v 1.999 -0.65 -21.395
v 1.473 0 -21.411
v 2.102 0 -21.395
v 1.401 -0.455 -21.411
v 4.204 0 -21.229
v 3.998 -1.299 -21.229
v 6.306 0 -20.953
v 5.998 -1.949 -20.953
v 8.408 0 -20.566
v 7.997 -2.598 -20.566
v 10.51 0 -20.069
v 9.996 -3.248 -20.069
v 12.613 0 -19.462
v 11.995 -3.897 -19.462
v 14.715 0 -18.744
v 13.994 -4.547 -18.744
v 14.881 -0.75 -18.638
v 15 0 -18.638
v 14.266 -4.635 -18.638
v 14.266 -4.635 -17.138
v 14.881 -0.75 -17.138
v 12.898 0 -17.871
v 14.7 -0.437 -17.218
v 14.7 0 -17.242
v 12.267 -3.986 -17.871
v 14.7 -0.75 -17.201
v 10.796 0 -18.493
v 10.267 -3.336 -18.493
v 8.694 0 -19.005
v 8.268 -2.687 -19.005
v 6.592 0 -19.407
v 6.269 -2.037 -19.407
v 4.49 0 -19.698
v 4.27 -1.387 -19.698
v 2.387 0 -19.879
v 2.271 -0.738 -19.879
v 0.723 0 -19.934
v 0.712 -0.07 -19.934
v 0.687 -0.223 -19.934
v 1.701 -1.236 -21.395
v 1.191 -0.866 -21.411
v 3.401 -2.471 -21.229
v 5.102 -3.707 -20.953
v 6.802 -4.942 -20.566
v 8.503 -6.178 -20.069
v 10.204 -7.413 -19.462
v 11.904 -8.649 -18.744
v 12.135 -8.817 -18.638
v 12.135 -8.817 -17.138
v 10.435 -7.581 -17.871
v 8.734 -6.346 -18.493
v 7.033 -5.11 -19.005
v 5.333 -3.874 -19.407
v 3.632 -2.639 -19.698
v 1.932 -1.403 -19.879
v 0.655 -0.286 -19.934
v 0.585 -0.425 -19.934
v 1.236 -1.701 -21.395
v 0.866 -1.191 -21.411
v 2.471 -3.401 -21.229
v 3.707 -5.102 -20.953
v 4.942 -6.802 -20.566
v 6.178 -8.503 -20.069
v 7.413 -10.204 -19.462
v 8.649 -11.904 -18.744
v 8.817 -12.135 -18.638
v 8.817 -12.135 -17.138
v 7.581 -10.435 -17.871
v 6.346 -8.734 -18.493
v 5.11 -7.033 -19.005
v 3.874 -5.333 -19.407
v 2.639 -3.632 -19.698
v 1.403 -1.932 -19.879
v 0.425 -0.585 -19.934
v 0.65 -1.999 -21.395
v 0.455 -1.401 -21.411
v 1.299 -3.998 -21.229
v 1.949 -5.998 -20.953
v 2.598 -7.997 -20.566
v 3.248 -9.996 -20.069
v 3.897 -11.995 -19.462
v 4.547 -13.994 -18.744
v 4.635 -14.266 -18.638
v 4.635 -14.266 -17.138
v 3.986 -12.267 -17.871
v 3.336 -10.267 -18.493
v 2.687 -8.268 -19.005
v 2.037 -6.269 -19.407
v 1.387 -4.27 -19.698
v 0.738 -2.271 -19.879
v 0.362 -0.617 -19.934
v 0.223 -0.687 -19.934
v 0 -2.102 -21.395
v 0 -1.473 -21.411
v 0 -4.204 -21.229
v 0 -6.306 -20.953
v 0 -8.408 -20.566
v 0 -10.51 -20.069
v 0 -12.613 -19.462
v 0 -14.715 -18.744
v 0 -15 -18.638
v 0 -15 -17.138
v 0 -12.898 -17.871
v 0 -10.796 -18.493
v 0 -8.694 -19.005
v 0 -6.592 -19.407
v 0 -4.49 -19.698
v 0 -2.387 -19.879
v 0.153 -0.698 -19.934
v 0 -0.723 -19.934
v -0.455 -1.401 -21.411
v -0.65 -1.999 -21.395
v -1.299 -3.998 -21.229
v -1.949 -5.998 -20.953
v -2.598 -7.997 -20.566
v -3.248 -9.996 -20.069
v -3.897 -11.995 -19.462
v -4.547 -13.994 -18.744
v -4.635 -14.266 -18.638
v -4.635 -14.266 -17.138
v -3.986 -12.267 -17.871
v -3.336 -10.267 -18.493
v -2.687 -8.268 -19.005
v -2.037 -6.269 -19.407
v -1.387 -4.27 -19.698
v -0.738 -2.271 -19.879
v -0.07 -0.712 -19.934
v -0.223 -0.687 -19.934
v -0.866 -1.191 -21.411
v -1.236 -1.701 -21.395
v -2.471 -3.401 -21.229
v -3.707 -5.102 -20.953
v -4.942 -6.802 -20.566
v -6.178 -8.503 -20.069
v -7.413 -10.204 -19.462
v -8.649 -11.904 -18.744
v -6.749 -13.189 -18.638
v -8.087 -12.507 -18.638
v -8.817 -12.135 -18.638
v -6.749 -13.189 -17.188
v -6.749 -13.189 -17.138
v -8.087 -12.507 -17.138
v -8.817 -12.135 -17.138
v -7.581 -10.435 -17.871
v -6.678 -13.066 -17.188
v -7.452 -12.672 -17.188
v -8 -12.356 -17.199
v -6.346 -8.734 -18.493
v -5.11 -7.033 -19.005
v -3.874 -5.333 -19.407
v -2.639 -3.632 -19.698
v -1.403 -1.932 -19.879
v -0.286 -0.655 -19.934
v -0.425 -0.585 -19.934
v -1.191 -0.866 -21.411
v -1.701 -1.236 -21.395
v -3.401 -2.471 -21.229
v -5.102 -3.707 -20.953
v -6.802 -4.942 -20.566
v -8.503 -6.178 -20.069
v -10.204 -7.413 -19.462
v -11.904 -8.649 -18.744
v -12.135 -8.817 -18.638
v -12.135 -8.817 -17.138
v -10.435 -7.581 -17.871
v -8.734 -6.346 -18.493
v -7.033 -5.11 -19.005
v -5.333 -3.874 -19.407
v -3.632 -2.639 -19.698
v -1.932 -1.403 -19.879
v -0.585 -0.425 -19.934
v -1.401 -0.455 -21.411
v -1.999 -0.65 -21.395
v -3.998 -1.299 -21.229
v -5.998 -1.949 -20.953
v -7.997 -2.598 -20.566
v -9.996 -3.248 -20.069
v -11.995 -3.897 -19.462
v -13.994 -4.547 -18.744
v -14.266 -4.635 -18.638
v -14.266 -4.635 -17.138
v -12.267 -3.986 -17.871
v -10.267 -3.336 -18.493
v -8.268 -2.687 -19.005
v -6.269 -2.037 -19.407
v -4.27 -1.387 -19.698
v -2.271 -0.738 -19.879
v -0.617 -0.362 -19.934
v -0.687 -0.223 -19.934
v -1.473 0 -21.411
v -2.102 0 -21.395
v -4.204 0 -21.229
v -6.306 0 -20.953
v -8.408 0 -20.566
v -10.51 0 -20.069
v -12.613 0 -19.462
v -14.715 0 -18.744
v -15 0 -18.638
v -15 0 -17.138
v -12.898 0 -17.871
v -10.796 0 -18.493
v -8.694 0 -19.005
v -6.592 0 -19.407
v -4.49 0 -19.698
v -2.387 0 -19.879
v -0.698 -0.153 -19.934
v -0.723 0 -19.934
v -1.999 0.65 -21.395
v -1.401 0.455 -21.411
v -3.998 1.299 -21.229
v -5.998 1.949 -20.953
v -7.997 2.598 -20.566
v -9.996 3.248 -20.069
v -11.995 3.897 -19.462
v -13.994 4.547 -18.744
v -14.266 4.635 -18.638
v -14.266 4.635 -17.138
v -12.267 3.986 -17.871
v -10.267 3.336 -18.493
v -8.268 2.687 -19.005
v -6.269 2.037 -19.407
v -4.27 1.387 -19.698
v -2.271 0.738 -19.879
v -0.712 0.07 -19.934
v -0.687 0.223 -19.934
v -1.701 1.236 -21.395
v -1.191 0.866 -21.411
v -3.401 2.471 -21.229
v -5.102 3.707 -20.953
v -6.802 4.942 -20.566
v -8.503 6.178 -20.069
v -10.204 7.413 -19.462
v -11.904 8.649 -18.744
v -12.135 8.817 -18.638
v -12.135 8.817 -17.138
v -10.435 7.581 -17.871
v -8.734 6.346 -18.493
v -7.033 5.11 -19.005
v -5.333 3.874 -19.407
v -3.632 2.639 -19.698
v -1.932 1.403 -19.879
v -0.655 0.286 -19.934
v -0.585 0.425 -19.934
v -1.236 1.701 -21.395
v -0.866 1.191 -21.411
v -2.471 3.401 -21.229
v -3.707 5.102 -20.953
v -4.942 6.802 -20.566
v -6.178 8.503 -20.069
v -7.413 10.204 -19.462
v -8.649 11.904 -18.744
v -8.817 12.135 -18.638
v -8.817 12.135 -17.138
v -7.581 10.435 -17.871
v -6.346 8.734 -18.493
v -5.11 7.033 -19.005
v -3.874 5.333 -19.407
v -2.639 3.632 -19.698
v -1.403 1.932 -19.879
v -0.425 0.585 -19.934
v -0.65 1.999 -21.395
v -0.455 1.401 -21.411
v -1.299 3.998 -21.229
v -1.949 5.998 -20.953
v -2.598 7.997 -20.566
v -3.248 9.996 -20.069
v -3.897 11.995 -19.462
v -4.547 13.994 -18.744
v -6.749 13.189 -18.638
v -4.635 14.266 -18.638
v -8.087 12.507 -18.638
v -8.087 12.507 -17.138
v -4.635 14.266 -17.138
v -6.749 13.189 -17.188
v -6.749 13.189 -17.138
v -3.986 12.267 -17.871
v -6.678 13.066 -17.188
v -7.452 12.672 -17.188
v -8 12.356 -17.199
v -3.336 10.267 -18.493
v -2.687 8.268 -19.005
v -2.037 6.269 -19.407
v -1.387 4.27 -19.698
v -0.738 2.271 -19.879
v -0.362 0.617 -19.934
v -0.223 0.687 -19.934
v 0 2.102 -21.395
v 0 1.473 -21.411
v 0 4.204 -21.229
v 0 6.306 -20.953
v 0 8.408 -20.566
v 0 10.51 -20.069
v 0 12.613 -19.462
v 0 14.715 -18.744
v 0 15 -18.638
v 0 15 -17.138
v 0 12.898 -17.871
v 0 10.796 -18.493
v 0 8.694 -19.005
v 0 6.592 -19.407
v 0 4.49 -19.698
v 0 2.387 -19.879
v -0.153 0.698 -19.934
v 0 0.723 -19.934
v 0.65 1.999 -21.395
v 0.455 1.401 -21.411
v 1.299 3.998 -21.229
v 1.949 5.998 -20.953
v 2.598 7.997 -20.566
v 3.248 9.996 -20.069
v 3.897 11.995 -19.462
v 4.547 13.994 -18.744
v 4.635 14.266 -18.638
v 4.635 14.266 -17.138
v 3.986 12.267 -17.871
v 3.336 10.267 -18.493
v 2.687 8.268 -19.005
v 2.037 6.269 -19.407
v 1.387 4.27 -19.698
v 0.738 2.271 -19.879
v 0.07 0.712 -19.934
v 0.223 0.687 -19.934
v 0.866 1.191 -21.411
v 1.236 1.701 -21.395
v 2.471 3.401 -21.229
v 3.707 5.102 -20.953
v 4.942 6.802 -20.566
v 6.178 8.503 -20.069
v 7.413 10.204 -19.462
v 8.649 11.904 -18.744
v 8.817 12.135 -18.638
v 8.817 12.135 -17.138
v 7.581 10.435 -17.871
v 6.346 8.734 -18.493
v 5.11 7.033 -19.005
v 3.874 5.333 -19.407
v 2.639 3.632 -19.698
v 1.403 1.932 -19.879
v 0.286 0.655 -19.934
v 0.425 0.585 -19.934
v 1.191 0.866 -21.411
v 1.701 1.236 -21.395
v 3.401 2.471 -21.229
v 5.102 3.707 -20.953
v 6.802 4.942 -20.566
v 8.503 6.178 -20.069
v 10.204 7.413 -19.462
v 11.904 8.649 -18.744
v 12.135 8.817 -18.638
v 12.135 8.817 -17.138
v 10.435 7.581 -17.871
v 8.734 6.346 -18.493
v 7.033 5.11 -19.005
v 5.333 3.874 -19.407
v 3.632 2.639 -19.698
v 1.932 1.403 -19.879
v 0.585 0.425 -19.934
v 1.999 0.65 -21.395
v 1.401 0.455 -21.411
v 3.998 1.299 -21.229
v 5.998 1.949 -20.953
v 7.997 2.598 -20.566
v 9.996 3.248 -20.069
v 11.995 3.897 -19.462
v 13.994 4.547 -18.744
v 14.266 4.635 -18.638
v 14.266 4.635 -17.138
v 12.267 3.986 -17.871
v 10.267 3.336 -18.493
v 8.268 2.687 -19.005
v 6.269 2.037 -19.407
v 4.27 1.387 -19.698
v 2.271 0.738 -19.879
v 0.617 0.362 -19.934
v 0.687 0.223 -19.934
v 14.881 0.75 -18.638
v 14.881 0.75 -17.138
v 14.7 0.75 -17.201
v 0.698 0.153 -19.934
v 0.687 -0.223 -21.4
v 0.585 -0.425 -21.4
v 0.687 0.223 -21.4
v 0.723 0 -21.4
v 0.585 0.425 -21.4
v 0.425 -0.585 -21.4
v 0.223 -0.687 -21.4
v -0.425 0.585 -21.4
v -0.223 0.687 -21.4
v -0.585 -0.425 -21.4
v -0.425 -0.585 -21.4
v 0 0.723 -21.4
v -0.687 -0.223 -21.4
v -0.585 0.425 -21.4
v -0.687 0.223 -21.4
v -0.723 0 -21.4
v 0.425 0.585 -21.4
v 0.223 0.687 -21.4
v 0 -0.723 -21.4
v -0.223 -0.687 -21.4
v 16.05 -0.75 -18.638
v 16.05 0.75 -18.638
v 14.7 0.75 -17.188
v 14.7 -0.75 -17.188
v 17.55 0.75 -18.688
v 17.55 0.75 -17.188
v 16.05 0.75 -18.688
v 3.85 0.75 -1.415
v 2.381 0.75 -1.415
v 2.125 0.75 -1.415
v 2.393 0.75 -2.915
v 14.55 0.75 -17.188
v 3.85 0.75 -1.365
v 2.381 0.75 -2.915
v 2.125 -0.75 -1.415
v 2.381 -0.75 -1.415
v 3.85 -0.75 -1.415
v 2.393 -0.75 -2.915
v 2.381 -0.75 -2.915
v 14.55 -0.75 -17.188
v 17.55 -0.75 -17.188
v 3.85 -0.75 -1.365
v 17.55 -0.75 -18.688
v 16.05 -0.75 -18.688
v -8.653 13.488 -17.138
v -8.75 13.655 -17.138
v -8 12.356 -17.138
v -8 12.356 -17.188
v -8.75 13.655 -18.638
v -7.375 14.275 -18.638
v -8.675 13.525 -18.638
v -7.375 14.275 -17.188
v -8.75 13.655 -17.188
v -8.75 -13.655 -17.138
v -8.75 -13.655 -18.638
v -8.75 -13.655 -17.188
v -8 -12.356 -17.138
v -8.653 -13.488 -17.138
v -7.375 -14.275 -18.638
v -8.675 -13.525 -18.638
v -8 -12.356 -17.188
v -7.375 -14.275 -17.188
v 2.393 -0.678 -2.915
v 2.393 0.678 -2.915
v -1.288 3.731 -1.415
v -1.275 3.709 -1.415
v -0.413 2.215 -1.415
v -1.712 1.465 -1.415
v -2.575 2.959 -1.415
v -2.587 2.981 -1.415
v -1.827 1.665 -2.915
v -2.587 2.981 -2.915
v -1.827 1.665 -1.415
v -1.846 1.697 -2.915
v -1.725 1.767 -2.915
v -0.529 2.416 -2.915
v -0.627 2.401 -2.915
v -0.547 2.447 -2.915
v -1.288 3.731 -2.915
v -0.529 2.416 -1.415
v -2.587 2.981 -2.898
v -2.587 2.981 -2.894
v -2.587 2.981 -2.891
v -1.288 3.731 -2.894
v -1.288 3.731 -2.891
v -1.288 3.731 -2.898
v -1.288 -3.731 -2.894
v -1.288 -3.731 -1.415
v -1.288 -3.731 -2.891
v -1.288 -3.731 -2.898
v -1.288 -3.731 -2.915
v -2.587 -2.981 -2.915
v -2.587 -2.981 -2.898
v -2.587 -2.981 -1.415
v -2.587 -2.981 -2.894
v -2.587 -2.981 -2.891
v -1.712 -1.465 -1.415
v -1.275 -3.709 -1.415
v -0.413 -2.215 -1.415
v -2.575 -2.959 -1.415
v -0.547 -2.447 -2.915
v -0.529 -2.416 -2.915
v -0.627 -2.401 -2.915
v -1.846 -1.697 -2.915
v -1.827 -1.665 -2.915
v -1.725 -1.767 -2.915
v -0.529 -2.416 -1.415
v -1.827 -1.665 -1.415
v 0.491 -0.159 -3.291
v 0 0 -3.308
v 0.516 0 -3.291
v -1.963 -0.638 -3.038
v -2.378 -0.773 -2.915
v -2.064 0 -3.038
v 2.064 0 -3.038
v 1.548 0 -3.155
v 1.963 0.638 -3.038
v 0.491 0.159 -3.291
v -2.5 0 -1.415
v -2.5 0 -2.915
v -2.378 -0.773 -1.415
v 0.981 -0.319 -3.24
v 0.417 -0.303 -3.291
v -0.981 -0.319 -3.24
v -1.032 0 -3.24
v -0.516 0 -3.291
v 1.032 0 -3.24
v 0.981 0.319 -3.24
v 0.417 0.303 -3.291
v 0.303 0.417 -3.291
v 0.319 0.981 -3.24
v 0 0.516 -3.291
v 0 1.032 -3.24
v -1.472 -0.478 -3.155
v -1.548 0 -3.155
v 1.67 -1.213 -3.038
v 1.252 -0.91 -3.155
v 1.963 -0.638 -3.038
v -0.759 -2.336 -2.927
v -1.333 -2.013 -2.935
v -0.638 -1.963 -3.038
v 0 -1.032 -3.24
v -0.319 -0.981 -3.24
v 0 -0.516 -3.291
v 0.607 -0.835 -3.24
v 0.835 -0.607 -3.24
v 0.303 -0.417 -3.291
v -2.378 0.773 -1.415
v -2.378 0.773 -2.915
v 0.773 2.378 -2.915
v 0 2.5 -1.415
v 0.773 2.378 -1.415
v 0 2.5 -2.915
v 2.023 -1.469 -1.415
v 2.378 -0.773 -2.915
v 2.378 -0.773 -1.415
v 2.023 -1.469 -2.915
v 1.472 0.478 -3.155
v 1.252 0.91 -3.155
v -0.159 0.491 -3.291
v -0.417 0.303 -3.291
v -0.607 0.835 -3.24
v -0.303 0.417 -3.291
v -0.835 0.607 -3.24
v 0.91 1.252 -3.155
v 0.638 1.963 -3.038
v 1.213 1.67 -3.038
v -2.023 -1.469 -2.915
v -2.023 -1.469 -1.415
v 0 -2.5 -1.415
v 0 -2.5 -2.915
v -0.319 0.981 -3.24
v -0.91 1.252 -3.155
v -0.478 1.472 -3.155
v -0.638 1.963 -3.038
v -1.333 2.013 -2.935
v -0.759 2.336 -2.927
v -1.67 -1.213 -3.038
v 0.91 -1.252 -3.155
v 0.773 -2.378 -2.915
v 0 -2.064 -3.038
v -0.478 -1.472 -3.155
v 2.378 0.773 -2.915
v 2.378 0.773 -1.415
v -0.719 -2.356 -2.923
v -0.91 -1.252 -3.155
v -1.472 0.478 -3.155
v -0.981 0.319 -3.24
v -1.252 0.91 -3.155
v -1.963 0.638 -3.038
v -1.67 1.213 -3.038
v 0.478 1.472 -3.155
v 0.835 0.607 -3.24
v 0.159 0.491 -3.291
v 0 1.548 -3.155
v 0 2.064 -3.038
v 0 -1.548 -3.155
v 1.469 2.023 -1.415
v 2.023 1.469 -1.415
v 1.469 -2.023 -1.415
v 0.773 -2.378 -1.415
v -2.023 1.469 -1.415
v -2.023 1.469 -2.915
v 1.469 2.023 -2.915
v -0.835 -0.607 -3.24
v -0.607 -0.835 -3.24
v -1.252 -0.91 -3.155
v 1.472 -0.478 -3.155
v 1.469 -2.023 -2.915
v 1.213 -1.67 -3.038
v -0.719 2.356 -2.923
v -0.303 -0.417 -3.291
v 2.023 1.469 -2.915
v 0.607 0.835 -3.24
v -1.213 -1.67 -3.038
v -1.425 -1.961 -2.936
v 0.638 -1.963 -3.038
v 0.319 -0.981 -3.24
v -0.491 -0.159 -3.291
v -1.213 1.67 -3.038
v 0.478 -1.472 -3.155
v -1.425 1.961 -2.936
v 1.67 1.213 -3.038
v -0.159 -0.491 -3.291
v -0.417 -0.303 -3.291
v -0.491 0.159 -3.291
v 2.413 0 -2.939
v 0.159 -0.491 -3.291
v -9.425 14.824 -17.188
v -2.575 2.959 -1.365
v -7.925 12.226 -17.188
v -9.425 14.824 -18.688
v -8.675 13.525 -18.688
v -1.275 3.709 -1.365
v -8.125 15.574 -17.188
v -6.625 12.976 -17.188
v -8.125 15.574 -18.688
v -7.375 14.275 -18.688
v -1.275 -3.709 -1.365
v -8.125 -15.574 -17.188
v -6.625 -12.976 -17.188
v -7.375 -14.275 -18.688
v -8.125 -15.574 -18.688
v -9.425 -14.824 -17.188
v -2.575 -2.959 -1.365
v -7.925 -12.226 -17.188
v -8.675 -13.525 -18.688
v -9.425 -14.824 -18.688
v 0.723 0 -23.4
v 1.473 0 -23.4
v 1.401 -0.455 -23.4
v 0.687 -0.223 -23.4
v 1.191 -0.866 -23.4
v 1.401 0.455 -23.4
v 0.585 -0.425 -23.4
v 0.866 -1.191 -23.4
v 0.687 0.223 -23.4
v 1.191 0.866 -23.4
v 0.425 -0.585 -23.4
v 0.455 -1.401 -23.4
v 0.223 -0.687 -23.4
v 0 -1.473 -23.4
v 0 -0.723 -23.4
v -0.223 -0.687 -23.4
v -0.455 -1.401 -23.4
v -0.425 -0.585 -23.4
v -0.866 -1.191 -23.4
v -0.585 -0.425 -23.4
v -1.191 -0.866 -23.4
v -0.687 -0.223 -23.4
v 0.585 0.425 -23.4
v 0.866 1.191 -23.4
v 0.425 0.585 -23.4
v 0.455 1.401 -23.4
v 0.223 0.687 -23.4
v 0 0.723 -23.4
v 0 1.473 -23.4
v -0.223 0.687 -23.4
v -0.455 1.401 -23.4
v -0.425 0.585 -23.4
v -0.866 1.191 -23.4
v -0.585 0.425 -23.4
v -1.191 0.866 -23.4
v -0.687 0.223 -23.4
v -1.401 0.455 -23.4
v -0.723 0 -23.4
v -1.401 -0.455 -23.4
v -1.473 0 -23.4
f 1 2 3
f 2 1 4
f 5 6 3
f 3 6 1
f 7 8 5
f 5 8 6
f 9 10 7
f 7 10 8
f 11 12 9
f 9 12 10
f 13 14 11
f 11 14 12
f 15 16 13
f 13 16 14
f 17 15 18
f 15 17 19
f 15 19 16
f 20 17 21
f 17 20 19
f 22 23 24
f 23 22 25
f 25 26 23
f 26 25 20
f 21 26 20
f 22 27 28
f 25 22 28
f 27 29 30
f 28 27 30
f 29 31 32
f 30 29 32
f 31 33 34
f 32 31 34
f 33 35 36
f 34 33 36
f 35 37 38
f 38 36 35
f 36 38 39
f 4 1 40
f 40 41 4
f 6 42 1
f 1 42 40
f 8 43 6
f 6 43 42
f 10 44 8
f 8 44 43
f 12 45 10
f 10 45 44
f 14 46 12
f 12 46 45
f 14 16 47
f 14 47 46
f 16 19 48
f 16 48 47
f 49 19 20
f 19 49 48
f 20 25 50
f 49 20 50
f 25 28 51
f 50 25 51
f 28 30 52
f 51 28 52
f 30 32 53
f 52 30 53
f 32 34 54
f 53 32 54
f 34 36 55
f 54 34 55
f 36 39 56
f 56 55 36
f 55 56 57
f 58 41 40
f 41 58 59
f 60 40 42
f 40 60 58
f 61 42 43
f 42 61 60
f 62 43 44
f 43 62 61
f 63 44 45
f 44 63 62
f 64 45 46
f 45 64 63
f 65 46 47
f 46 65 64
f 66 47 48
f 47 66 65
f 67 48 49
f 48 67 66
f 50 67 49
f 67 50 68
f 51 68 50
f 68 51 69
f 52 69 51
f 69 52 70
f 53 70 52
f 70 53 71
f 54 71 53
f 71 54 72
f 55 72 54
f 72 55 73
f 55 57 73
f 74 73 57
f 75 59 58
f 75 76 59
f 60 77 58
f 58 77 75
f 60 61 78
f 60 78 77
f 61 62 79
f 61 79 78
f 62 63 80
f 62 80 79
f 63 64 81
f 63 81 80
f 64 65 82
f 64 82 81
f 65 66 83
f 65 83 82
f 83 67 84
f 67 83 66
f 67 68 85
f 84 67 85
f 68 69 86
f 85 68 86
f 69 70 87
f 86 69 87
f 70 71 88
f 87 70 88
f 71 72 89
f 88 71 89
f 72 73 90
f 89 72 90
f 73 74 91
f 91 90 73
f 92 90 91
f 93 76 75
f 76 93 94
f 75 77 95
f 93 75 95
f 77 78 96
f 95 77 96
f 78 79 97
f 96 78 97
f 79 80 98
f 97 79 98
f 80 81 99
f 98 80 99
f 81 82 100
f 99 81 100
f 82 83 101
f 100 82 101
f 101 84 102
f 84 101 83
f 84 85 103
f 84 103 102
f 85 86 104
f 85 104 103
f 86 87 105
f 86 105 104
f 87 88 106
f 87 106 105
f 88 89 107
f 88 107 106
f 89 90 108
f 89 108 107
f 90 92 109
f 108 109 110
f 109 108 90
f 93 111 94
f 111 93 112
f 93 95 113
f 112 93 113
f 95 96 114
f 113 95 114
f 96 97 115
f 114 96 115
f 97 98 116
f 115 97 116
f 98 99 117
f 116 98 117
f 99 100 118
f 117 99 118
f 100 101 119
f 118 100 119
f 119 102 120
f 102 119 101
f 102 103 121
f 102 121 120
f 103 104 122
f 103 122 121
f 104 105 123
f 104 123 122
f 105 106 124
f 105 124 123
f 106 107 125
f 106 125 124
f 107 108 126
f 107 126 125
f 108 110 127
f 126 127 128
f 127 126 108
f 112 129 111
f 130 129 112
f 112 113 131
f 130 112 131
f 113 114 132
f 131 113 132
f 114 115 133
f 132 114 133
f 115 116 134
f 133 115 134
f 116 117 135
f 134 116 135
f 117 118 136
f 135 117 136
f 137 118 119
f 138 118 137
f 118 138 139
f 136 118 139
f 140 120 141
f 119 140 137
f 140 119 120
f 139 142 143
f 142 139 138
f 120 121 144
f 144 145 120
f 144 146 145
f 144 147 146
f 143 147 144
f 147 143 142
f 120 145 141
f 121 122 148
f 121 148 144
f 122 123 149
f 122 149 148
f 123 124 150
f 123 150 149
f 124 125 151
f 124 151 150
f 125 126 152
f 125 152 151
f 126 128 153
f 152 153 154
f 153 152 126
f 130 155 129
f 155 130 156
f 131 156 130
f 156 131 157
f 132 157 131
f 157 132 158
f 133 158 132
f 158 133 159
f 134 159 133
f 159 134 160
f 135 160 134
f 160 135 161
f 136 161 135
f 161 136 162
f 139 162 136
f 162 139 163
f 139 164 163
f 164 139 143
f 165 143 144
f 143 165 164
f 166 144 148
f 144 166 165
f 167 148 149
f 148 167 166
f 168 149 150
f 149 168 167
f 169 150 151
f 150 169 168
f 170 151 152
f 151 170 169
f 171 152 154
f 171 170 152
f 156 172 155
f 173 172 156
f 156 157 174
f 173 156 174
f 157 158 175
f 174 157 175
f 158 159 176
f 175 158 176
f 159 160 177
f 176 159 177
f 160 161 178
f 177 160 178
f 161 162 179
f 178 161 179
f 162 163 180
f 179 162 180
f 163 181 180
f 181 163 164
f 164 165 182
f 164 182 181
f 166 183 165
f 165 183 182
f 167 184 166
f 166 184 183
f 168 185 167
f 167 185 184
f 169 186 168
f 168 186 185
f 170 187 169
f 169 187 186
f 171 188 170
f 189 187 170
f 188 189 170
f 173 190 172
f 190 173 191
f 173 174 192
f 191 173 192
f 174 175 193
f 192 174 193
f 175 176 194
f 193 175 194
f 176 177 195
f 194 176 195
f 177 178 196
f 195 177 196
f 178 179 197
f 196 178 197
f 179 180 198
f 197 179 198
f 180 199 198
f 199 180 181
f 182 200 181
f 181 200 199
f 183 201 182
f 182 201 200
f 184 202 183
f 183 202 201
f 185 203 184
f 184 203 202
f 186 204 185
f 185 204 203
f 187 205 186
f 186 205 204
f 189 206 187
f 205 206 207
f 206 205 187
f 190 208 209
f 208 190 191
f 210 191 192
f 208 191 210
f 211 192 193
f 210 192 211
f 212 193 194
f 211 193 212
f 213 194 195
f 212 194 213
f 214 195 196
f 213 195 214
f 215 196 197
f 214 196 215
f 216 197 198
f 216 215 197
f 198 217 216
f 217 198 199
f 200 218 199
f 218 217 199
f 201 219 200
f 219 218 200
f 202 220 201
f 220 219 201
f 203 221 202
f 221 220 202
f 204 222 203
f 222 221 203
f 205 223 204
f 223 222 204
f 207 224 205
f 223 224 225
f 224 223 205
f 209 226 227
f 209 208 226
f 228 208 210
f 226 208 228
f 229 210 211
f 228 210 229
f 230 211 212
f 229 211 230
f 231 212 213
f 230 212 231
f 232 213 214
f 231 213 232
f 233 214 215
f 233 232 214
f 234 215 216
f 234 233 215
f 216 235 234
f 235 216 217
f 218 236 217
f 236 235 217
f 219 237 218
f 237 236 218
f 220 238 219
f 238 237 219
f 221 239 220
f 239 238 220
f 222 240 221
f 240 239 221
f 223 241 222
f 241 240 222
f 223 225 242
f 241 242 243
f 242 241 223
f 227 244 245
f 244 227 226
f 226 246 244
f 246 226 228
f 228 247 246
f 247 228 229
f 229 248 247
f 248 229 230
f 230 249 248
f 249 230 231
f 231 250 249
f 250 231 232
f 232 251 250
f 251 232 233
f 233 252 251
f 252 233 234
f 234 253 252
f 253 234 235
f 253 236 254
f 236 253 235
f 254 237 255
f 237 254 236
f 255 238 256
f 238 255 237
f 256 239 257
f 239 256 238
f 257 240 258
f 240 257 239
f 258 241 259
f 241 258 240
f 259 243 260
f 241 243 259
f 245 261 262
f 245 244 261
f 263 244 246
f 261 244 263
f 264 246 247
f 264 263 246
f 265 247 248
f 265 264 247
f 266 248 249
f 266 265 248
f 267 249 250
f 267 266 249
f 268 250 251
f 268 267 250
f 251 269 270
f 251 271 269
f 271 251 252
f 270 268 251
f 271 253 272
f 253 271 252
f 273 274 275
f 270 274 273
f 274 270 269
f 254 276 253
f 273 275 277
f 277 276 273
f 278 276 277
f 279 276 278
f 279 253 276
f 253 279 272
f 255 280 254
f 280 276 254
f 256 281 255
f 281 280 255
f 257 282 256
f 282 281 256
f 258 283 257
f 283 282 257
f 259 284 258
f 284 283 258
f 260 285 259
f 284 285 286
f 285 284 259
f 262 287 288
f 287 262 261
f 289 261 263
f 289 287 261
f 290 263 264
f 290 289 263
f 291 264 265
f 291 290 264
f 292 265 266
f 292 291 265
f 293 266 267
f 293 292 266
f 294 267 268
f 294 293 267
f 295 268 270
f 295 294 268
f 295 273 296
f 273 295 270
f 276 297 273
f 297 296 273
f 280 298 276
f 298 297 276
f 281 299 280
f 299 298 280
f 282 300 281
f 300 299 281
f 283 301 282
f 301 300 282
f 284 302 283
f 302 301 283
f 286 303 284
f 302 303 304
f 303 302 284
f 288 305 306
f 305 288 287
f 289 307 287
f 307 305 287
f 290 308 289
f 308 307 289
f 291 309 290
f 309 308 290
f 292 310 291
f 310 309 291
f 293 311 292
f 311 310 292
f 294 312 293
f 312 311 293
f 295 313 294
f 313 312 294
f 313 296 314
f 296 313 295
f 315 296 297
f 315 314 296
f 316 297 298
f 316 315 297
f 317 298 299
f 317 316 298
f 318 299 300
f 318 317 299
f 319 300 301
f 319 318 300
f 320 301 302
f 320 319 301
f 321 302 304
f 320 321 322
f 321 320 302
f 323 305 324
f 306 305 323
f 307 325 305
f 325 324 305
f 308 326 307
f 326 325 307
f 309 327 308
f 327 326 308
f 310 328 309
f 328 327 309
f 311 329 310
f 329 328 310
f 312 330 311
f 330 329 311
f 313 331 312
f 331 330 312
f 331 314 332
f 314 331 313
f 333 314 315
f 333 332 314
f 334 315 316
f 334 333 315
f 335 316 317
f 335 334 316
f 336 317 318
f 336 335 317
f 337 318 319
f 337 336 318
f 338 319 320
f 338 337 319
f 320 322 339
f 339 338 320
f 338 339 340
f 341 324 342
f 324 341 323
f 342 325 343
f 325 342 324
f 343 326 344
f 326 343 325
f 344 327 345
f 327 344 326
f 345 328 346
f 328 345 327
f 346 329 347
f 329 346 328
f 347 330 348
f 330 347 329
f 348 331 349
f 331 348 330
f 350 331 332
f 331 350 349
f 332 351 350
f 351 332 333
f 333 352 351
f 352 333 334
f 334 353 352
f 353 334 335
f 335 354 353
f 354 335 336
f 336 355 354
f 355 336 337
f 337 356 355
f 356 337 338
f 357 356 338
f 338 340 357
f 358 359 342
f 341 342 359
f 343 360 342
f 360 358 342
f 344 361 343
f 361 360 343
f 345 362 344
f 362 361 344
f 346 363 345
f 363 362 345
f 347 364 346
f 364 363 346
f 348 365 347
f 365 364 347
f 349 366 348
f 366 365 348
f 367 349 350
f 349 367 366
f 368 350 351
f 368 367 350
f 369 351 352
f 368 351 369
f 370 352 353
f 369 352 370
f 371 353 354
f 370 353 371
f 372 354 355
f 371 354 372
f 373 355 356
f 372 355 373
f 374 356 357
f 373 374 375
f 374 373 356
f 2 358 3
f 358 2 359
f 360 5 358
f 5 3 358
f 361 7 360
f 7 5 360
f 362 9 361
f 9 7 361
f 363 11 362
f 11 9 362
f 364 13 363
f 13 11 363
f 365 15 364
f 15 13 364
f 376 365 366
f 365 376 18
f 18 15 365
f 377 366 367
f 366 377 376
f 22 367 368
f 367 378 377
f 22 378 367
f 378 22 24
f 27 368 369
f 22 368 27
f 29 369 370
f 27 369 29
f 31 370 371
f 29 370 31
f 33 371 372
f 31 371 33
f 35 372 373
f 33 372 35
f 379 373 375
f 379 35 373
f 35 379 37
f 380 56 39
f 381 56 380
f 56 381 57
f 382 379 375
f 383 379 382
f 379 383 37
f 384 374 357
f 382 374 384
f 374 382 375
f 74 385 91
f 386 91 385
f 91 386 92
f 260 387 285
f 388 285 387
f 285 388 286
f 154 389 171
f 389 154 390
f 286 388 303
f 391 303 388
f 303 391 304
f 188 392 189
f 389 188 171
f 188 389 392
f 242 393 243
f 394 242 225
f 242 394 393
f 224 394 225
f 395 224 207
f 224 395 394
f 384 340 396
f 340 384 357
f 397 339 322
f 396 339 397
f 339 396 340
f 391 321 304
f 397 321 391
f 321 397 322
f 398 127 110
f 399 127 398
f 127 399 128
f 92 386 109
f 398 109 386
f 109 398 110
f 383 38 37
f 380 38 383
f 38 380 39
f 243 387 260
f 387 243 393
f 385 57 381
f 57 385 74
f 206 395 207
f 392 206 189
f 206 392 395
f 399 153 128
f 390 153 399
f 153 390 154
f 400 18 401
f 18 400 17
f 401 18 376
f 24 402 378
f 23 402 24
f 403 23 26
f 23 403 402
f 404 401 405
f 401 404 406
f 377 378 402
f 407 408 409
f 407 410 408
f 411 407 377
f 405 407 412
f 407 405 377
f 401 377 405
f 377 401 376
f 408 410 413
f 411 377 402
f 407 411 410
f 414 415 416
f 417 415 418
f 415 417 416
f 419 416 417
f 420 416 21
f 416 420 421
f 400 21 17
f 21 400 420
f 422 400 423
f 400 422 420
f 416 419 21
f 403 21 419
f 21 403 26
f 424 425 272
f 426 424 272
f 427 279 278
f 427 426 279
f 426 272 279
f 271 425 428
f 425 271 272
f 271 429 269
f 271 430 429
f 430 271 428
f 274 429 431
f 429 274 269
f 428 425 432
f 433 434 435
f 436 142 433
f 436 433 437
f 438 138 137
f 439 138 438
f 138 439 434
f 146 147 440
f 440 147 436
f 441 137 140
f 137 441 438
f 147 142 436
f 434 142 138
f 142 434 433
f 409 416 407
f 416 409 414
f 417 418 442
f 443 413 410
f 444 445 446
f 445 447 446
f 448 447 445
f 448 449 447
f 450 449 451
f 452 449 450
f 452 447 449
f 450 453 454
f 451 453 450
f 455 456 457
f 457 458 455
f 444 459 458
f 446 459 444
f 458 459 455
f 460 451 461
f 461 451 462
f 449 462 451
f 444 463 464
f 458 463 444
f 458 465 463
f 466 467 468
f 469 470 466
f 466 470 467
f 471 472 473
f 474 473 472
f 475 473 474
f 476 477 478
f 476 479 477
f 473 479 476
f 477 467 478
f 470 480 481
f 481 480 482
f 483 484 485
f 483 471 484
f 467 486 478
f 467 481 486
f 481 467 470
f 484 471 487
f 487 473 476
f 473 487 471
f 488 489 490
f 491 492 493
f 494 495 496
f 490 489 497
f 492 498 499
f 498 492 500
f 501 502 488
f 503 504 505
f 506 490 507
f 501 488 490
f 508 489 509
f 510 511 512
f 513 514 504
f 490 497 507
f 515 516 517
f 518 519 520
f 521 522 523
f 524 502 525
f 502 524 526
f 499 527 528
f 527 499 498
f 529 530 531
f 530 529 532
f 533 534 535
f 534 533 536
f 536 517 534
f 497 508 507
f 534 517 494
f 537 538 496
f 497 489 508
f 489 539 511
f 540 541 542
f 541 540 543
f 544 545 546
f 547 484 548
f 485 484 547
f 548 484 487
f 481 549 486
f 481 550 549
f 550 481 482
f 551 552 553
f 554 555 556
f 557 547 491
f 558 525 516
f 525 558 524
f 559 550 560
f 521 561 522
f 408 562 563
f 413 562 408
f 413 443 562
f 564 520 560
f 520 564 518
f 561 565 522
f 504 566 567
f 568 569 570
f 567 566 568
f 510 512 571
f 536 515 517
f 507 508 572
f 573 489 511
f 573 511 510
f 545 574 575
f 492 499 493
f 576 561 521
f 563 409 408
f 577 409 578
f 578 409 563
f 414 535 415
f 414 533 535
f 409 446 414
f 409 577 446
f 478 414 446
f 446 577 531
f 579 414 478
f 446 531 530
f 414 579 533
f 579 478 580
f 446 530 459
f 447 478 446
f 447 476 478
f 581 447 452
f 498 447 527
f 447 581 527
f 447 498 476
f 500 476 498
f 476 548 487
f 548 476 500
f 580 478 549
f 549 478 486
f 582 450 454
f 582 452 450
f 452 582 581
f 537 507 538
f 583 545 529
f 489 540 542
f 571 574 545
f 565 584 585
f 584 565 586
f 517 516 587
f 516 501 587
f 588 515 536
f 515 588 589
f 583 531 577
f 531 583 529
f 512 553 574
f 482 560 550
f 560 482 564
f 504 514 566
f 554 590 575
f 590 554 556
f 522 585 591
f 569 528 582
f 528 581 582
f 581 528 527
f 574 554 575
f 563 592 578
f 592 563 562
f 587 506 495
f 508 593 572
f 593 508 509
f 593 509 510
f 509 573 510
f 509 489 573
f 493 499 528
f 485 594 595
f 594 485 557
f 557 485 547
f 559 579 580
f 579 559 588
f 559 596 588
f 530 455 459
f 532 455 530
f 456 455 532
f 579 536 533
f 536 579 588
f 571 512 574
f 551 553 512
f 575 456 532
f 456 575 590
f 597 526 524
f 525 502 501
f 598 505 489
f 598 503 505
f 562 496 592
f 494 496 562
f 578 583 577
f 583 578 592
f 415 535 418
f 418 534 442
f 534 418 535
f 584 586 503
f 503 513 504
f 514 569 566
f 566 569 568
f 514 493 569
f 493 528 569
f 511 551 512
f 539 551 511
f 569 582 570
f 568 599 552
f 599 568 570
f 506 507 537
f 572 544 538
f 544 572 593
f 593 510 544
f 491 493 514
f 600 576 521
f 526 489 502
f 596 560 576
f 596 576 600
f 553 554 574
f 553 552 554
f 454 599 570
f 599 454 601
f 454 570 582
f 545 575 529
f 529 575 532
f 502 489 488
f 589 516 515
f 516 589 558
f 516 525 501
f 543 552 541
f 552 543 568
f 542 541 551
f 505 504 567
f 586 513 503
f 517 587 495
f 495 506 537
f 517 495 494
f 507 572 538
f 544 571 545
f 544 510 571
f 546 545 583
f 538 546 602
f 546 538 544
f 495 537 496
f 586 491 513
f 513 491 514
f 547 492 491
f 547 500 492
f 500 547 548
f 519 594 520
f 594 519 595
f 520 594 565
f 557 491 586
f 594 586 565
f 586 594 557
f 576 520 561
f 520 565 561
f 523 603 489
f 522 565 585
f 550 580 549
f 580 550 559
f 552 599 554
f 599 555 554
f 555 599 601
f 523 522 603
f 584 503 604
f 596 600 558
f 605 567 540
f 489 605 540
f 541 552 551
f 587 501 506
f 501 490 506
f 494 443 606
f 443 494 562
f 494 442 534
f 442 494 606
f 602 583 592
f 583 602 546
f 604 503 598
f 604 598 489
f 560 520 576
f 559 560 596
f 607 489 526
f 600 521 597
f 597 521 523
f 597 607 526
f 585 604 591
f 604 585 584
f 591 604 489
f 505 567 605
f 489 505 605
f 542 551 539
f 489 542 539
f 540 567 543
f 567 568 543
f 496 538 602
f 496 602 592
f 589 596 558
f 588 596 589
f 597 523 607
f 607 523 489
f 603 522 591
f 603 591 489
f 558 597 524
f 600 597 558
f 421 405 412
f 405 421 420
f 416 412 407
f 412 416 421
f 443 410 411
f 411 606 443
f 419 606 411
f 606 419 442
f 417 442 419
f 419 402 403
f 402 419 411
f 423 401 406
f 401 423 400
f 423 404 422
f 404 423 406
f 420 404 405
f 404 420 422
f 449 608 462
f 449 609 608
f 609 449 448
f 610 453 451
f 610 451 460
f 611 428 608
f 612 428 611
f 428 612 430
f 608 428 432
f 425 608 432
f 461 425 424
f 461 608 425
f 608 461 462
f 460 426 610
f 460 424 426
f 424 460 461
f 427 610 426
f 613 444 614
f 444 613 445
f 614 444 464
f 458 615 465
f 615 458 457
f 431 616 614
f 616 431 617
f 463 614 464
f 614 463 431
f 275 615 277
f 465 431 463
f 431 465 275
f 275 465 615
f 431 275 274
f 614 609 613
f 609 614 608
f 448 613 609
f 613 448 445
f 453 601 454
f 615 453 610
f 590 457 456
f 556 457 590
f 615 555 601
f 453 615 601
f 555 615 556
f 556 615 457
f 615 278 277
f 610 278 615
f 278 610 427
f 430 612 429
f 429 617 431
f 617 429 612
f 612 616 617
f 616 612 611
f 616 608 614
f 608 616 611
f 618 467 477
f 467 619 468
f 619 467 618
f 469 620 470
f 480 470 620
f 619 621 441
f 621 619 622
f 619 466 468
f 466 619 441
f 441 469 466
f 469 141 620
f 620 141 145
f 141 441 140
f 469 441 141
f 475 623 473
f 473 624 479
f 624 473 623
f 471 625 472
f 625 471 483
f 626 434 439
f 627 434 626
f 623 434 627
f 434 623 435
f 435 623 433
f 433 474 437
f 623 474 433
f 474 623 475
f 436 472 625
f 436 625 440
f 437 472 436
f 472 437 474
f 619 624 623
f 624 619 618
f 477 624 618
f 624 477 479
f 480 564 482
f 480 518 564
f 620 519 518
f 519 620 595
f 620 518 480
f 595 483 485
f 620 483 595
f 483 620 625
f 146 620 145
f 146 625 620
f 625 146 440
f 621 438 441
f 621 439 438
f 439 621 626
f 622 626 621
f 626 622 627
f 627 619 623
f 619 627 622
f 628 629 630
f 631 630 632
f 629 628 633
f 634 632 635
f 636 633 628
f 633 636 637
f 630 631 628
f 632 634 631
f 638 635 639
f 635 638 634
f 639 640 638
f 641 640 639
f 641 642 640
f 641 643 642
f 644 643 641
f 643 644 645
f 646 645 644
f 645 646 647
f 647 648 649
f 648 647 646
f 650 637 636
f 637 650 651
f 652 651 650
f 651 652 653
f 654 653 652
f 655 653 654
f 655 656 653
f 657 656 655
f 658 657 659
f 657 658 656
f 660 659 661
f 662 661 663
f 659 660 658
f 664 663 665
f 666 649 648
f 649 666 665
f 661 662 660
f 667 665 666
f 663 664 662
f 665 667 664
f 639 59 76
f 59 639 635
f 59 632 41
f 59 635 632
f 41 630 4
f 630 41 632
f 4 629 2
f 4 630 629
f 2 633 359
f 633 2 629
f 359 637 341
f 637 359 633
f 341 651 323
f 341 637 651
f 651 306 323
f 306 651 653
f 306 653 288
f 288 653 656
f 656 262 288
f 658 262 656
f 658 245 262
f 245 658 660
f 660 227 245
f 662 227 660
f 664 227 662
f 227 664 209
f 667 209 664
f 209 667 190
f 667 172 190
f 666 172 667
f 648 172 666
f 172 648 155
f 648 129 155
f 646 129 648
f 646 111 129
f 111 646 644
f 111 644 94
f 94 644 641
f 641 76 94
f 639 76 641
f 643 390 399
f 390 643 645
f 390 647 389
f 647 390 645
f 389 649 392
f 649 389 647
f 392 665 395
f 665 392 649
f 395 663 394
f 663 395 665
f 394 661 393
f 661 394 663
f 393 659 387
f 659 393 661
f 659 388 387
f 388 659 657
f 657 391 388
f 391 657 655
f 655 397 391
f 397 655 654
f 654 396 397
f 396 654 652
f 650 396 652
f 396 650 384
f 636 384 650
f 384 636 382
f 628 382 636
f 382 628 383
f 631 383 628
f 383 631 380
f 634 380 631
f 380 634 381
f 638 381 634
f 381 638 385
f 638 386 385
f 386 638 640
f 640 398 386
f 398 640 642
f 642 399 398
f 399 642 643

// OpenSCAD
//Cassegrain Dish
//Ari M Diacou
//December 2016

/***************Source***************\
Peter Hannan, "Microwave antennas derived from the cassegrain telescope," in IRE Transactions on Antennas and Propagation, vol. 9, no. 2, pp. 140-153, March 1961.

URL: http://ieeexplore.ieee.org/stamp/stamp.jsp?tp=&arnumber=1144976&isnumber=25737 

http://ieeexplore.ieee.org/document/1144976/
https://sci-hub.cc/10.1109/TAP.1961.1144976
DOI: 10.1109/TAP.1961.1144976 
\************************************/
/*///////////////////////// Instructions //////////////////////////////
This thing creates a customizable Cassegrain Reflector dish. It was created using the equations from the paper by Peter Hannan, "Microwave antennas derived from the cassegrain telescope," in IRE Transactions on Antennas and Propagation, vol. 9, no. 2, pp. 140-153, March 1961.

If you are using customizer, playing with values, use the "mockup" mode. If you want to print it straight (which you should only use if you are using a resin printer or Shapeways or another fused dust printer), then use "solid". "For printing" should be used on a FFF printer (most of you). If using an FFF printer, the pieces are arranged so that they can be printed best on a flat bed. Feel free to rearrange the pieces on your slicer. The STLs provided will work if scaled all by the same amount, but the physics will not work out if you have different scaling for x,y,z.

If printing on an FFF printer, use supports for the dish. Infill doesnt matter as long as there are no holes in your pieces. Once all the pieces are printed, the waveguide gets glueed (I recommend a clear superglue, like cyanoacrylate) to the back of the main reflector. The struts get glued to the main reflector and the secondary reflector. The bulge on the scondary reflector is supposed to point towards the concave part of the main reflector. The spike looking thing is a ruler. You stick the thin end in the hole of the main reflector, and the secondary reflector sits on top of the ruler, so that you know how far apart they are supposed to be. The thin part of the ruler measuers the distance between the reflecting face of the main reflector, and where the focus/sensor/microphone/speaker/lightbulb is supposed to be. Check "mockup" mode if you are unsure how the pieces are supposed to be arranged. The ruler is not to be glued to any pieces. Remove the ruler (I guess by cutting it in half) once you have assembled the struts and secondary reflector.

Theory
Cassegrain reflectors are used in radio telescopes, and are based off of the optical Cassegrain Telescopes. While Cassegrain reflectors will work theoretically with any wave, the physics assumptions that they are designed with assume that the distance between the main and secondary reflectors is more than 3 wavelengths. This can present problems if you are using this for Radio or Sound waves. But, if you know enough physics to want to use a cassegrain reflector as a tool, you can figure out how to calculate the wavelength of the signal you are using (Hint: λ=v/f).

Suggestions for use as a tool:
    ►Stick the waveguide in you ear, see what you can hear.
    ►Glue aluminum foil to the main and secondary reflectors, and use it as a flashlight by putting an LED in the waveguide.
    ►Glue aluminum foil to the main and secondary reflectors, stick a coil of wire in the waveguide, and use it as a radio receiver.
    ►Glue aluminum foil to the main and secondary reflectors, stick an IR photodiode in the waveguide, and use it in photo-communications projects. Bonus points if you mod one of your home entertainment systems to use this!    */

//////////////////////////// Parameters ///////////////////////////////
//is the focal lenth of the main reflector.
focal_main=20;
//is the diameter of the main refector.
diameter_main=30;
//is the distance below the bottom of the reflector that you want the electronics to be (the collector point, or the real focus of the whole system).
x_e=2;
//is the diameter of the secondary reflector.
diameter_secondary=5;
//How do you want your parts arranged?
display_type=2;//[1:Mockup,2:Solid,3:For Printing]
//that support the secondary reflector from the main reflector
number_of_struts=3;//[0,1,2,3,4]
//is the number of segments make up a circle. Higher is smoother, but with larger file size, and longer rendering time. Customizer will fail silently if there are too many facets.
$fn=20;
/*[Hidden]*/
//////////////////////// Derived Parameters ///////////////////////////
//Suggested filename
echo(str("Suggested filename: Cassegrain Dish ",type_string,"-Fm=",focal_main,"Dm=",diameter_main,"Xe=",x_e,"Ds=",diameter_secondary,"Ns=",number_of_struts));
type_string=(display_type==1)?"mockup":((display_type==2)?"solid":"printable");
//epsilon, a small value used to ensure mainfold-ness
ep=0+0.05;
//The thickness of the main reflector, and the added thickness of the secondary reflector
thickness=0.05*diameter_main;
//The angle that the edges of the mirrors make with the virtual focus (
focal_collector=focal_main+x_e+thickness;
phi_v=2*atan(diameter_main/focal_main/4); //Hannan, Eq. 1
//The angle between the boresight axis (z), the real focal point (C, which is x_e behind the main reflector), and the edge of the secondary reflector
phi_r=atan(1/(2*(focal_collector)/diameter_secondary-1/tan(phi_v))); //Hannan, Eq. 2
//The eccentricty of a hyperbola (http://mathworld.wolfram.com/Hyperbola.html, Eq. 9)
e=sin((phi_v+phi_r)/2)/sin((phi_v-phi_r)/2); //Hannan, Eq. 5.e
//In the canonical form of a hyperbola (x/a)^2-(y/b)^2=1, these are the cononical denominators (http://mathworld.wolfram.com/Hyperbola.html, Eq. 7)
a=(focal_collector)/e/2; //Hannan, Eq. 5.a
b=a*sqrt(e*e-1); //Hannan, Eq. 5.b
l_v=(focal_collector)*(1-1/e)/2; //Hannan, Eq. 3
//The highest point on the edge of the secondary dish
x_s_max=x_secondary(diameter_secondary/2);
//The highest point on the edge of the main dish
x_m_max=x_main(diameter_main/2);
//The number of radial steps that make the curve of the main dish,smaller steps means more facets
step_main=focal_main*tan(360/$fn/3);
//The number of radial steps that make the curve of the main dish,smaller steps means more facets
step_secondary=l_v*tan(360/$fn/2);
//echo(str("$fn=",$fn,", phi_v=",phi_v," step_main=",step_main));
//echo(str("$fn=",$fn,", phi_v=",phi_v," step_secondary=",step_secondary));
//The diameter of the hole in the main reflector
hole_diameter=1+1.03*(focal_collector-focal_main)*diameter_secondary/(focal_collector-l_v)/2;
ms_dimensions=[hole_diameter*1.25,min(2,thickness),focal_main-l_v-x_main(hole_diameter*1.25/2)];
mc_dimensions=[hole_diameter/2,min(2,thickness,hole_diameter/2),thickness+x_e+ep];
strut_thickness=thickness;
////////////////////////////// Main() /////////////////////////////////
if(display_type==1){
    color("slategrey") translate([0,0,-focal_main-thickness-ep]) main_mirror();
    color("slategrey") translate([0,0,-l_v+ep]) secondary_mirror();
    #translate([0,0,-l_v]) 
        ruler();
    color("grey") translate([0,0,-focal_main-x_e-thickness-2*ep]) waveguide();
    for(j=[0:number_of_struts-1])
        rotate([90,0,j*360/number_of_struts])
            strut();
    }
else if(display_type==2){
    color("slategrey") 
        translate([0,0,-focal_main-thickness+1*ep])
            main_mirror();
    color("slategrey") 
        translate([0,0,-l_v-1*ep]) 
            secondary_mirror();
    color("grey") 
        translate([0,0,-focal_main-x_e-thickness+2*ep]) 
            waveguide();
    for(j=[0:number_of_struts-1])
        rotate([90,0,j*360/number_of_struts])
            translate([-ep-0.02*diameter_secondary,0,0])
                strut();
    }    
else{
    color("slategrey") 
        translate([0,0,0])
            main_mirror();
    color("slategrey") 
        translate([0,.5*diameter_main+2*strut_thickness+diameter_secondary,thickness]) 
            mirror([0,0,1]) secondary_mirror();
    color("grey") 
        translate(diameter_main*[-.4,.6,0]) 
            waveguide();
    for(j=[0:number_of_struts-1])
        translate([.6*diameter_main+strut_thickness,(2*j+0)*strut_thickness+.7*(focal_main+l_v),0])
            rotate([0,0,-phi_v])
                translate([(3*j+1)*strut_thickness,0,0])
                    strut();
    translate([-.8*diameter_main,-.5*focal_main,0])
        rotate([90,0,0]) 
            ruler();
    }
//////////////////////////// Functions ////////////////////////////////
module strut(){
    A=[diameter_secondary/2,-l_v+x_s_max];
    B=A+[strut_thickness,0];
    C=B+[0,thickness];
    H=[.49*diameter_main,-focal_main+x_m_max];
    D=H+[2*strut_thickness,0];
    E=D+[0,-thickness];
    F=E+[-strut_thickness,0];
    G=(H+D)/2;
    
    strut_points=[A,B,C,D,E,F,G,H]; 
    //echo(struct_points);
    //*for(i=[0:len(struct_points)-1])
    //    translate(struct_points[i])
    //        #text(chr(65+i),size=.6*strut_thickness);
    translate([0,0,-strut_thickness/2])
        linear_extrude(strut_thickness)
            polygon(strut_points);
    }
    
module waveguide(){
    if(x_e>thickness){
        linear_extrude(x_e-0*thickness){
            difference(){
                circle(d=hole_diameter+thickness);
                circle(d=hole_diameter);
                }
            }
        }
    }
module ruler(){
    translate([0,0,-ms_dimensions[2]/2-0*l_v])
        cube(ms_dimensions,center=true);
    translate([0,0,-ms_dimensions[2]-mc_dimensions[2]/2+ep]) 
        cube(mc_dimensions,center=true);
    }
module main_mirror(){
    main_points=concat(
        [for(i=[0:step_main:diameter_main/2])
            [x_main(i),i]
            ]
        ,[[x_m_max,diameter_main/2]]
        ,[for(i=[diameter_main/2:-step_main:0])
            [x_main(i)+thickness,i]
            ]
        ,[[thickness,0]]
        );
    //echo(main_points);
    difference(){
        rotate_extrude()
            rotate(90) 
                polygon(main_points);   
        cylinder(h=thickness*1.1, d=hole_diameter);
        }
    for(i=[0:number_of_struts-1])
        rotate([0,0,i*360/number_of_struts])
            translate([0.49*diameter_main+strut_thickness/2,0,x_m_max+thickness/2])
                cube([strut_thickness,strut_thickness,thickness],center=true);
    }
module secondary_mirror(){
    secondary_points=concat(
        [for(i=[0:step_secondary:diameter_secondary/2])
            [x_secondary(i),i]
            ]
        ,[[x_s_max,diameter_secondary/2],[x_s_max+thickness,diameter_secondary/2],[x_s_max+thickness,0]]
        );
    
    rotate_extrude()
        rotate(90) 
            polygon(secondary_points);
    for(i=[0:number_of_struts-1])
        rotate([0,0,i*360/number_of_struts])
            translate([0.45*diameter_secondary+strut_thickness/2,0,x_s_max+thickness/2])
                cube([0.05*diameter_secondary+strut_thickness,strut_thickness,thickness],center=true);
    }
//height (x) as a function of the radial distance from the center of the main reflector (a parabola). Eq. 4
function x_main(y_main)=y_main*y_main/focal_main/4;
//height (x) as a function of the radial distance from the center of the secondary reflector (a hyperbola). Eq. 5
function x_secondary(y_secondary)=a*(-1+sqrt(1+pow(y_secondary/b,2)));
